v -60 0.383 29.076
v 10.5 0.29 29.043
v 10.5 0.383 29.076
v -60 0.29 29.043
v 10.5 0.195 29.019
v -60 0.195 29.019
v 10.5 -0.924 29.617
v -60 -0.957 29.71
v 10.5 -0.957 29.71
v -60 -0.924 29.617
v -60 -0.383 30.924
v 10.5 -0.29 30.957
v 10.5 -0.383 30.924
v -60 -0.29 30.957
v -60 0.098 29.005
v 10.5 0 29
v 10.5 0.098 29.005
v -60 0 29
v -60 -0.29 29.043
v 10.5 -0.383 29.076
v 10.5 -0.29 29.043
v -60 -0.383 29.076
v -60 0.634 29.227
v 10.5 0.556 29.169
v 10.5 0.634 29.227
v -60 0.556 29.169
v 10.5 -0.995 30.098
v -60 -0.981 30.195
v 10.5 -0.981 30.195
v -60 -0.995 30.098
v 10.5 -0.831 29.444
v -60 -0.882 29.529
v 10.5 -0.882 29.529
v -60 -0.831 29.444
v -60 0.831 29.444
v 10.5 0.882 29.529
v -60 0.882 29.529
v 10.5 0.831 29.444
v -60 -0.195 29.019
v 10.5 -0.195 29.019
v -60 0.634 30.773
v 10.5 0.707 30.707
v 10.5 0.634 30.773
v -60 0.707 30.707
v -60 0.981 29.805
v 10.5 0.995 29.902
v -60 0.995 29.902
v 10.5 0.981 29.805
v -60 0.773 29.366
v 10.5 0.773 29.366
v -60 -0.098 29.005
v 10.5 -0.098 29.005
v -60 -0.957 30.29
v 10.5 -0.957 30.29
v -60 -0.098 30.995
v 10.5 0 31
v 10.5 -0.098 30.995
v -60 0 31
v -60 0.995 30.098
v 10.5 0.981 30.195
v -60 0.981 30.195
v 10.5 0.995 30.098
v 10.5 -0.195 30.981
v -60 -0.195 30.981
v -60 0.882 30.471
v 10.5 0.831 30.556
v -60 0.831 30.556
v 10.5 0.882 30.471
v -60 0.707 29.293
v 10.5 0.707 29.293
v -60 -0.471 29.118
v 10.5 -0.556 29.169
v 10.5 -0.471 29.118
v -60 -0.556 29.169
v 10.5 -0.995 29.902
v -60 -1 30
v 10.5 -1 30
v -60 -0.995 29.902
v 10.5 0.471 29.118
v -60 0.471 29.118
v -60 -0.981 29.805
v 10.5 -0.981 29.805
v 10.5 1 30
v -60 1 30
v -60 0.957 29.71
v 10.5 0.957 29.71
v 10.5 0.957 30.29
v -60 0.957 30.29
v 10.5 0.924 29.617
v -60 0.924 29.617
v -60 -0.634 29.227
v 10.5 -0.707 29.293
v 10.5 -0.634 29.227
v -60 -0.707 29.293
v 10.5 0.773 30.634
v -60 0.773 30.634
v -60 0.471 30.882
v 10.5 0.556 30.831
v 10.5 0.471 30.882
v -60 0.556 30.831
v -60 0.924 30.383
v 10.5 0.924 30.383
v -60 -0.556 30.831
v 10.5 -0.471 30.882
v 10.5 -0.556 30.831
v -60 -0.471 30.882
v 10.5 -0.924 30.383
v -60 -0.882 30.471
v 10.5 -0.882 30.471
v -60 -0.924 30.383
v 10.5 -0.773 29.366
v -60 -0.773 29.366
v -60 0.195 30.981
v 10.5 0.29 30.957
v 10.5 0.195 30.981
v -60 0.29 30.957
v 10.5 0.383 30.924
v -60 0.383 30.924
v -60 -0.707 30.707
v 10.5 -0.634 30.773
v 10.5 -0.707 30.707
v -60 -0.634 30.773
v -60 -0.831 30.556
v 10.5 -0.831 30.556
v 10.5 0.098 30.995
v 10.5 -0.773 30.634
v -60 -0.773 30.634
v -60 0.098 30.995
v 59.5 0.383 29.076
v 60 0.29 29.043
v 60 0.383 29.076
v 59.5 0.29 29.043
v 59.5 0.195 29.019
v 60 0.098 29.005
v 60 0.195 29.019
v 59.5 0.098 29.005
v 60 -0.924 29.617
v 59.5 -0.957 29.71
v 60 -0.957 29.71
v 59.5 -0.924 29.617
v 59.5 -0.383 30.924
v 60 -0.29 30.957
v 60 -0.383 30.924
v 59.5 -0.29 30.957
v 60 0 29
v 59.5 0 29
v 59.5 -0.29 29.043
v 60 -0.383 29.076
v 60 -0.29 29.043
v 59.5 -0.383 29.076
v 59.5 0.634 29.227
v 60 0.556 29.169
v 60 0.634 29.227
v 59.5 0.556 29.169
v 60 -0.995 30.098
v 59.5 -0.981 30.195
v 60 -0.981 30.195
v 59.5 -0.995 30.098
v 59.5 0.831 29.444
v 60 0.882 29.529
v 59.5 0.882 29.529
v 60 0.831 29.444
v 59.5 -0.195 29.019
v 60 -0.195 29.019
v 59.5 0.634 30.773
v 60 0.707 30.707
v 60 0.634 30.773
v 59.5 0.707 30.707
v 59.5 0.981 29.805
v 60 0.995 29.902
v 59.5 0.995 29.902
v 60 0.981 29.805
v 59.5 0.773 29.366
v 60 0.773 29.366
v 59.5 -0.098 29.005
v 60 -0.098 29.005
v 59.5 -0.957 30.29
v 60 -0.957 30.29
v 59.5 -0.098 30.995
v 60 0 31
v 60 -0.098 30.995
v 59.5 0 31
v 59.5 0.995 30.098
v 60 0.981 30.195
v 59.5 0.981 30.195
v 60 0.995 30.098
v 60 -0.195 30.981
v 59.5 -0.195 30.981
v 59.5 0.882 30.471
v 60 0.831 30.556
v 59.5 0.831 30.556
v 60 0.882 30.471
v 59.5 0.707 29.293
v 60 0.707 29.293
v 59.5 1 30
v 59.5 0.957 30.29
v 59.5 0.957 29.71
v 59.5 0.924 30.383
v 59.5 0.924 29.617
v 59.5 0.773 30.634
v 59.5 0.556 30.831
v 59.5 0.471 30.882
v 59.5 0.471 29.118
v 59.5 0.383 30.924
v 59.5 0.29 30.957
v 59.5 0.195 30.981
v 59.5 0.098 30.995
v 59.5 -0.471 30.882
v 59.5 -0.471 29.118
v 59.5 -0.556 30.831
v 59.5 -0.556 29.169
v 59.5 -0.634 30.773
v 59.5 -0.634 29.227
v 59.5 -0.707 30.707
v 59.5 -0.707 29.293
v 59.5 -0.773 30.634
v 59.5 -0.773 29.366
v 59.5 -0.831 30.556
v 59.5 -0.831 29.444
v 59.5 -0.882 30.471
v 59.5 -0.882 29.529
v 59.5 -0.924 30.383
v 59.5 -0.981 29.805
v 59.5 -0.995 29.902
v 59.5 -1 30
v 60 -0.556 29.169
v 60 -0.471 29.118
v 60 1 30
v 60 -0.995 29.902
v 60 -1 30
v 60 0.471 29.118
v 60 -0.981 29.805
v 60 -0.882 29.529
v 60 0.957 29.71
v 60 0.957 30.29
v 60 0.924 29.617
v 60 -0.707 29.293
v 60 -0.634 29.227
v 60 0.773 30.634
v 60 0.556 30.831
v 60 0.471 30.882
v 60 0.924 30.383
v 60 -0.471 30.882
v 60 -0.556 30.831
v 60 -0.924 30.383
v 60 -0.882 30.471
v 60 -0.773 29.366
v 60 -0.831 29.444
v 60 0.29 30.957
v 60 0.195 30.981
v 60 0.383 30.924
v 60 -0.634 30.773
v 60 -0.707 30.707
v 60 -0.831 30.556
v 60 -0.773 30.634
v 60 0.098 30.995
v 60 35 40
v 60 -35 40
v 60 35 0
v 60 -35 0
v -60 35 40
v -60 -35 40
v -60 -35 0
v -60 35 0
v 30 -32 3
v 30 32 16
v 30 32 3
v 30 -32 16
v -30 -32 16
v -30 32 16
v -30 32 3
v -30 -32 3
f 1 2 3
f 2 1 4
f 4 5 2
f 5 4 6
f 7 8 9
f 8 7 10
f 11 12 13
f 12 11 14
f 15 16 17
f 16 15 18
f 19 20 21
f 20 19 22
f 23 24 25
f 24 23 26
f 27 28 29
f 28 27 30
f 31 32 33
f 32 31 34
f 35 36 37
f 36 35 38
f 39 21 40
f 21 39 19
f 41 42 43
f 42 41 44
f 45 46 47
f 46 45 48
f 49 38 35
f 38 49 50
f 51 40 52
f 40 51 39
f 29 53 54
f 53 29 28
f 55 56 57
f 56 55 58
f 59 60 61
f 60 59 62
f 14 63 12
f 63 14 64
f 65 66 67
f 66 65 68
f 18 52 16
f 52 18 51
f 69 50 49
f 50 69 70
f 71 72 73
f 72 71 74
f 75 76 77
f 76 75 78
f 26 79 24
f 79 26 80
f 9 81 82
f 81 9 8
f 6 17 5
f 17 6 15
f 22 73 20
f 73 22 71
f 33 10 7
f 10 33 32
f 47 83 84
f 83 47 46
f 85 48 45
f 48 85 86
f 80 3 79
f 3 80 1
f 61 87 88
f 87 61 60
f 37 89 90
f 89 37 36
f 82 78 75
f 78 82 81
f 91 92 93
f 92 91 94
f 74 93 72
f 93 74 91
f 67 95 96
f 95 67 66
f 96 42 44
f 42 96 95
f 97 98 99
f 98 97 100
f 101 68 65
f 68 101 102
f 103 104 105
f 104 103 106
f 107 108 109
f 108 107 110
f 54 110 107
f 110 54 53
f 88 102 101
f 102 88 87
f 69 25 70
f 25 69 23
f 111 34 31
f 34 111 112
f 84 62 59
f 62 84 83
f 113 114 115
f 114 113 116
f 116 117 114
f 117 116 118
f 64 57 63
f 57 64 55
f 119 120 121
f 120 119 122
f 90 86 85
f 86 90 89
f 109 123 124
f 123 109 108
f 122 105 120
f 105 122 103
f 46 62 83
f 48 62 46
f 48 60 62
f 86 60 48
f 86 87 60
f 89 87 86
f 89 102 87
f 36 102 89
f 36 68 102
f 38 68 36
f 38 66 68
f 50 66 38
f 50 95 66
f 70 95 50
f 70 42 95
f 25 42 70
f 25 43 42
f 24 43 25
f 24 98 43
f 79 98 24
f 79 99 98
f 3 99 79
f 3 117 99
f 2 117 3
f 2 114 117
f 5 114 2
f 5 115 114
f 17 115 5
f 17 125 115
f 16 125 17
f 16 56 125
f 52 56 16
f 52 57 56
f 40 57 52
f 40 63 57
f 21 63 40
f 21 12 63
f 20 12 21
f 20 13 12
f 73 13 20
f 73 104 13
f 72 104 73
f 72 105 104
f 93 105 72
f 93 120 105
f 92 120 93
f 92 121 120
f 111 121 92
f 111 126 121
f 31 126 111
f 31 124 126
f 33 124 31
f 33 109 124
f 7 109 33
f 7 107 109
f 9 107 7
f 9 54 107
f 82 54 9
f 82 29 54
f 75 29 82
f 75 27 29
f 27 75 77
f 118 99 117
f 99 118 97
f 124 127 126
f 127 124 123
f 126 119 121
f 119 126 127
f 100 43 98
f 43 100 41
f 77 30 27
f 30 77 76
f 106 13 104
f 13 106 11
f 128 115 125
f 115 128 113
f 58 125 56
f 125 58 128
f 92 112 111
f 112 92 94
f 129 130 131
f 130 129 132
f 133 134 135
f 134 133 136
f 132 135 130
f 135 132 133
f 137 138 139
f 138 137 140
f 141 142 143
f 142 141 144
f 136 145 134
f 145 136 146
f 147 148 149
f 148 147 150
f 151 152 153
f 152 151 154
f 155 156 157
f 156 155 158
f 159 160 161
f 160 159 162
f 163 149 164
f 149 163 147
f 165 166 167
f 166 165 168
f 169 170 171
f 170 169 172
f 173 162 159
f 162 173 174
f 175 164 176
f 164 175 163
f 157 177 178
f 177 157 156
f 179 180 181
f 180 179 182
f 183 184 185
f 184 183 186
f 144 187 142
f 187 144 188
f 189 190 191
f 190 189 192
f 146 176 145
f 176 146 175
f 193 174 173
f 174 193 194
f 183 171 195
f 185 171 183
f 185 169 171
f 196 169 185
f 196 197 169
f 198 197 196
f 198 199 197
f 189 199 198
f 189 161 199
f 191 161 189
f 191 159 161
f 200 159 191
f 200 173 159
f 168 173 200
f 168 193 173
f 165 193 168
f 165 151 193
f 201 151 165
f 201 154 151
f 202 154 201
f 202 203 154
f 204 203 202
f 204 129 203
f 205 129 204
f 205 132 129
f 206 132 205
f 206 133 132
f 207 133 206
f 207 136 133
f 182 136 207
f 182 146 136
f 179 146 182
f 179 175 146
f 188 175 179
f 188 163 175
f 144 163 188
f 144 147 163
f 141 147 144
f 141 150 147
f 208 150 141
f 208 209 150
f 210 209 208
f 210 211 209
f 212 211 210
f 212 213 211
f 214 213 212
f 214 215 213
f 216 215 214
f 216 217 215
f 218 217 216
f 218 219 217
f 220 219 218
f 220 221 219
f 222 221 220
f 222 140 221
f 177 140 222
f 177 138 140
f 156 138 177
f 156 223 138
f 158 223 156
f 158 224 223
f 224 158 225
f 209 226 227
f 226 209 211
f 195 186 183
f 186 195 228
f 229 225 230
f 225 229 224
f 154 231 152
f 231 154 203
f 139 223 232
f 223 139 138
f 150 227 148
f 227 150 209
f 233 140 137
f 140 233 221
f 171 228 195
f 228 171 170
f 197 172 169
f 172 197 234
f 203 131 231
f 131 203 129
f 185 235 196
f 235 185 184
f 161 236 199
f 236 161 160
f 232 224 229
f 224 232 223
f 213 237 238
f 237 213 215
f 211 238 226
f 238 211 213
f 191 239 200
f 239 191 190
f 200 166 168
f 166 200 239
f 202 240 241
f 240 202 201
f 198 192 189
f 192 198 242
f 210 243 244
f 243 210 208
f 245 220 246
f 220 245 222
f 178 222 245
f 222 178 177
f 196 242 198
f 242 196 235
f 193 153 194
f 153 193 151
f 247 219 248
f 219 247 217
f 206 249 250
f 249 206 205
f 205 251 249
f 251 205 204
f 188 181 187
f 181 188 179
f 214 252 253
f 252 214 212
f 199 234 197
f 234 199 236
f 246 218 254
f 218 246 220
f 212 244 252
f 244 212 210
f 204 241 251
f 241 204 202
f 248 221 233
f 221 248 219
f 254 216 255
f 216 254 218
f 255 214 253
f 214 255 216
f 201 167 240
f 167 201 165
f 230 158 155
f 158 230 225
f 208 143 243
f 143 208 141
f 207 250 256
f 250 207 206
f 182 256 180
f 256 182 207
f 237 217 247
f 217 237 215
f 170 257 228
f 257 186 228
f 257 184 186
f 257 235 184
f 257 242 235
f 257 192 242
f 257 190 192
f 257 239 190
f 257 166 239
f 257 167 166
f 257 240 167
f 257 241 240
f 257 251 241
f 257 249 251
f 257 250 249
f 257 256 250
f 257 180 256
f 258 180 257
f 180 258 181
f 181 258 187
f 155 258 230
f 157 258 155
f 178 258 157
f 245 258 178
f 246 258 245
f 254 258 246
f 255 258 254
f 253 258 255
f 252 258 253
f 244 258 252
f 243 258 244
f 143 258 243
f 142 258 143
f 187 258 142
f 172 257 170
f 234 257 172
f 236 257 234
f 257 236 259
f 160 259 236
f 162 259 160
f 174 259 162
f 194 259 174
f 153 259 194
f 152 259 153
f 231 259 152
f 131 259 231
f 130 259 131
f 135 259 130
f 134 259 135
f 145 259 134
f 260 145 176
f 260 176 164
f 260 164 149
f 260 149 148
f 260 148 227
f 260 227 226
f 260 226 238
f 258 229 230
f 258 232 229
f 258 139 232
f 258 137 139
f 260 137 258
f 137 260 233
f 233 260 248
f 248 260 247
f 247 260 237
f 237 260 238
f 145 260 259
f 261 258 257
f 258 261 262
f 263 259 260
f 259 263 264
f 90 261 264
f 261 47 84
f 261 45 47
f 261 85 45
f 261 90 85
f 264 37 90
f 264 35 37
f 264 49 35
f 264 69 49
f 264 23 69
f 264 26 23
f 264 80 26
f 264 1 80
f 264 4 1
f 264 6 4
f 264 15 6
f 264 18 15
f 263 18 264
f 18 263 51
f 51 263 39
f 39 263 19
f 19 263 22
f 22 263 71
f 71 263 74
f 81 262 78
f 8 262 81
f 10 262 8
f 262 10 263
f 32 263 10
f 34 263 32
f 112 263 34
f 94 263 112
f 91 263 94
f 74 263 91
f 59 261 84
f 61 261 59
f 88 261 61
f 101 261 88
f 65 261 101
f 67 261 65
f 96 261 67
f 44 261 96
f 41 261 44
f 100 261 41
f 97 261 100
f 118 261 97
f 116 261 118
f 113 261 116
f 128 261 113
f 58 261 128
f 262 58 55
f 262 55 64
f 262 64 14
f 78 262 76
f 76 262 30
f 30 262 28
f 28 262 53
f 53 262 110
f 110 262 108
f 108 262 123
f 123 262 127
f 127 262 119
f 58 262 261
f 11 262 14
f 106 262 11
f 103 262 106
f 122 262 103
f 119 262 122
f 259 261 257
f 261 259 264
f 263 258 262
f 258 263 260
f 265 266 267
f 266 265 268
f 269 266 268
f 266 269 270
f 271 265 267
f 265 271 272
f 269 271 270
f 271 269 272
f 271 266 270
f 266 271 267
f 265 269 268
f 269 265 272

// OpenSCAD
// Mini horizontal gel-electrophoresis buffer tank
// Print orientation: tank rests on XY plane at z = 0, open top

// ---------- Parameters ----------
tank_x      = 120;   // outer length in X
tank_y      = 70;    // outer width in Y
tank_h      = 40;    // outer height in Z
wall        = 3;     // wall thickness (sides and floor)
floor       = 3;     // floor thickness (under raised platform)
platform_x  = 60;    // platform length in X (centred)
platform_t  = 10;    // platform height above inner floor
hole_d      = 2;     // electrode hole diameter
hole_y      = 0;     // electrode hole Y position
hole_z      = 30;    // electrode hole Z position
eps         = 0.5;   // cutter overshoot past faces

$fn = 64;

// ---------- Derived ----------
inner_f = tank_y - 2 * wall;              // inner width (Y) of tank
plat_t  = floor + platform_t;             // platform top height (z = 13)

// ---------- Model ----------
difference() {
    // Tank body: outer block with open top
    translate([-tank_x/2, -tank_y/2, 0])
        cube([tank_x, tank_y, tank_h]);

    // Raised platform in middle, spanning full inner width
    translate([-platform_x/2, -inner_f/2, floor])
        cube([platform_x, inner_f, plat_t]);

    // Horizontal electrode holes through each end wall along X
    for (sx = [-1, 1])
        translate([sx > 0 ? tank_x/2 - eps : -tank_x/2 - eps, hole_y, hole_z])
            rotate([0, 90, 0])
                cylinder(d = hole_d, h = tank_y + 2*eps);
}
